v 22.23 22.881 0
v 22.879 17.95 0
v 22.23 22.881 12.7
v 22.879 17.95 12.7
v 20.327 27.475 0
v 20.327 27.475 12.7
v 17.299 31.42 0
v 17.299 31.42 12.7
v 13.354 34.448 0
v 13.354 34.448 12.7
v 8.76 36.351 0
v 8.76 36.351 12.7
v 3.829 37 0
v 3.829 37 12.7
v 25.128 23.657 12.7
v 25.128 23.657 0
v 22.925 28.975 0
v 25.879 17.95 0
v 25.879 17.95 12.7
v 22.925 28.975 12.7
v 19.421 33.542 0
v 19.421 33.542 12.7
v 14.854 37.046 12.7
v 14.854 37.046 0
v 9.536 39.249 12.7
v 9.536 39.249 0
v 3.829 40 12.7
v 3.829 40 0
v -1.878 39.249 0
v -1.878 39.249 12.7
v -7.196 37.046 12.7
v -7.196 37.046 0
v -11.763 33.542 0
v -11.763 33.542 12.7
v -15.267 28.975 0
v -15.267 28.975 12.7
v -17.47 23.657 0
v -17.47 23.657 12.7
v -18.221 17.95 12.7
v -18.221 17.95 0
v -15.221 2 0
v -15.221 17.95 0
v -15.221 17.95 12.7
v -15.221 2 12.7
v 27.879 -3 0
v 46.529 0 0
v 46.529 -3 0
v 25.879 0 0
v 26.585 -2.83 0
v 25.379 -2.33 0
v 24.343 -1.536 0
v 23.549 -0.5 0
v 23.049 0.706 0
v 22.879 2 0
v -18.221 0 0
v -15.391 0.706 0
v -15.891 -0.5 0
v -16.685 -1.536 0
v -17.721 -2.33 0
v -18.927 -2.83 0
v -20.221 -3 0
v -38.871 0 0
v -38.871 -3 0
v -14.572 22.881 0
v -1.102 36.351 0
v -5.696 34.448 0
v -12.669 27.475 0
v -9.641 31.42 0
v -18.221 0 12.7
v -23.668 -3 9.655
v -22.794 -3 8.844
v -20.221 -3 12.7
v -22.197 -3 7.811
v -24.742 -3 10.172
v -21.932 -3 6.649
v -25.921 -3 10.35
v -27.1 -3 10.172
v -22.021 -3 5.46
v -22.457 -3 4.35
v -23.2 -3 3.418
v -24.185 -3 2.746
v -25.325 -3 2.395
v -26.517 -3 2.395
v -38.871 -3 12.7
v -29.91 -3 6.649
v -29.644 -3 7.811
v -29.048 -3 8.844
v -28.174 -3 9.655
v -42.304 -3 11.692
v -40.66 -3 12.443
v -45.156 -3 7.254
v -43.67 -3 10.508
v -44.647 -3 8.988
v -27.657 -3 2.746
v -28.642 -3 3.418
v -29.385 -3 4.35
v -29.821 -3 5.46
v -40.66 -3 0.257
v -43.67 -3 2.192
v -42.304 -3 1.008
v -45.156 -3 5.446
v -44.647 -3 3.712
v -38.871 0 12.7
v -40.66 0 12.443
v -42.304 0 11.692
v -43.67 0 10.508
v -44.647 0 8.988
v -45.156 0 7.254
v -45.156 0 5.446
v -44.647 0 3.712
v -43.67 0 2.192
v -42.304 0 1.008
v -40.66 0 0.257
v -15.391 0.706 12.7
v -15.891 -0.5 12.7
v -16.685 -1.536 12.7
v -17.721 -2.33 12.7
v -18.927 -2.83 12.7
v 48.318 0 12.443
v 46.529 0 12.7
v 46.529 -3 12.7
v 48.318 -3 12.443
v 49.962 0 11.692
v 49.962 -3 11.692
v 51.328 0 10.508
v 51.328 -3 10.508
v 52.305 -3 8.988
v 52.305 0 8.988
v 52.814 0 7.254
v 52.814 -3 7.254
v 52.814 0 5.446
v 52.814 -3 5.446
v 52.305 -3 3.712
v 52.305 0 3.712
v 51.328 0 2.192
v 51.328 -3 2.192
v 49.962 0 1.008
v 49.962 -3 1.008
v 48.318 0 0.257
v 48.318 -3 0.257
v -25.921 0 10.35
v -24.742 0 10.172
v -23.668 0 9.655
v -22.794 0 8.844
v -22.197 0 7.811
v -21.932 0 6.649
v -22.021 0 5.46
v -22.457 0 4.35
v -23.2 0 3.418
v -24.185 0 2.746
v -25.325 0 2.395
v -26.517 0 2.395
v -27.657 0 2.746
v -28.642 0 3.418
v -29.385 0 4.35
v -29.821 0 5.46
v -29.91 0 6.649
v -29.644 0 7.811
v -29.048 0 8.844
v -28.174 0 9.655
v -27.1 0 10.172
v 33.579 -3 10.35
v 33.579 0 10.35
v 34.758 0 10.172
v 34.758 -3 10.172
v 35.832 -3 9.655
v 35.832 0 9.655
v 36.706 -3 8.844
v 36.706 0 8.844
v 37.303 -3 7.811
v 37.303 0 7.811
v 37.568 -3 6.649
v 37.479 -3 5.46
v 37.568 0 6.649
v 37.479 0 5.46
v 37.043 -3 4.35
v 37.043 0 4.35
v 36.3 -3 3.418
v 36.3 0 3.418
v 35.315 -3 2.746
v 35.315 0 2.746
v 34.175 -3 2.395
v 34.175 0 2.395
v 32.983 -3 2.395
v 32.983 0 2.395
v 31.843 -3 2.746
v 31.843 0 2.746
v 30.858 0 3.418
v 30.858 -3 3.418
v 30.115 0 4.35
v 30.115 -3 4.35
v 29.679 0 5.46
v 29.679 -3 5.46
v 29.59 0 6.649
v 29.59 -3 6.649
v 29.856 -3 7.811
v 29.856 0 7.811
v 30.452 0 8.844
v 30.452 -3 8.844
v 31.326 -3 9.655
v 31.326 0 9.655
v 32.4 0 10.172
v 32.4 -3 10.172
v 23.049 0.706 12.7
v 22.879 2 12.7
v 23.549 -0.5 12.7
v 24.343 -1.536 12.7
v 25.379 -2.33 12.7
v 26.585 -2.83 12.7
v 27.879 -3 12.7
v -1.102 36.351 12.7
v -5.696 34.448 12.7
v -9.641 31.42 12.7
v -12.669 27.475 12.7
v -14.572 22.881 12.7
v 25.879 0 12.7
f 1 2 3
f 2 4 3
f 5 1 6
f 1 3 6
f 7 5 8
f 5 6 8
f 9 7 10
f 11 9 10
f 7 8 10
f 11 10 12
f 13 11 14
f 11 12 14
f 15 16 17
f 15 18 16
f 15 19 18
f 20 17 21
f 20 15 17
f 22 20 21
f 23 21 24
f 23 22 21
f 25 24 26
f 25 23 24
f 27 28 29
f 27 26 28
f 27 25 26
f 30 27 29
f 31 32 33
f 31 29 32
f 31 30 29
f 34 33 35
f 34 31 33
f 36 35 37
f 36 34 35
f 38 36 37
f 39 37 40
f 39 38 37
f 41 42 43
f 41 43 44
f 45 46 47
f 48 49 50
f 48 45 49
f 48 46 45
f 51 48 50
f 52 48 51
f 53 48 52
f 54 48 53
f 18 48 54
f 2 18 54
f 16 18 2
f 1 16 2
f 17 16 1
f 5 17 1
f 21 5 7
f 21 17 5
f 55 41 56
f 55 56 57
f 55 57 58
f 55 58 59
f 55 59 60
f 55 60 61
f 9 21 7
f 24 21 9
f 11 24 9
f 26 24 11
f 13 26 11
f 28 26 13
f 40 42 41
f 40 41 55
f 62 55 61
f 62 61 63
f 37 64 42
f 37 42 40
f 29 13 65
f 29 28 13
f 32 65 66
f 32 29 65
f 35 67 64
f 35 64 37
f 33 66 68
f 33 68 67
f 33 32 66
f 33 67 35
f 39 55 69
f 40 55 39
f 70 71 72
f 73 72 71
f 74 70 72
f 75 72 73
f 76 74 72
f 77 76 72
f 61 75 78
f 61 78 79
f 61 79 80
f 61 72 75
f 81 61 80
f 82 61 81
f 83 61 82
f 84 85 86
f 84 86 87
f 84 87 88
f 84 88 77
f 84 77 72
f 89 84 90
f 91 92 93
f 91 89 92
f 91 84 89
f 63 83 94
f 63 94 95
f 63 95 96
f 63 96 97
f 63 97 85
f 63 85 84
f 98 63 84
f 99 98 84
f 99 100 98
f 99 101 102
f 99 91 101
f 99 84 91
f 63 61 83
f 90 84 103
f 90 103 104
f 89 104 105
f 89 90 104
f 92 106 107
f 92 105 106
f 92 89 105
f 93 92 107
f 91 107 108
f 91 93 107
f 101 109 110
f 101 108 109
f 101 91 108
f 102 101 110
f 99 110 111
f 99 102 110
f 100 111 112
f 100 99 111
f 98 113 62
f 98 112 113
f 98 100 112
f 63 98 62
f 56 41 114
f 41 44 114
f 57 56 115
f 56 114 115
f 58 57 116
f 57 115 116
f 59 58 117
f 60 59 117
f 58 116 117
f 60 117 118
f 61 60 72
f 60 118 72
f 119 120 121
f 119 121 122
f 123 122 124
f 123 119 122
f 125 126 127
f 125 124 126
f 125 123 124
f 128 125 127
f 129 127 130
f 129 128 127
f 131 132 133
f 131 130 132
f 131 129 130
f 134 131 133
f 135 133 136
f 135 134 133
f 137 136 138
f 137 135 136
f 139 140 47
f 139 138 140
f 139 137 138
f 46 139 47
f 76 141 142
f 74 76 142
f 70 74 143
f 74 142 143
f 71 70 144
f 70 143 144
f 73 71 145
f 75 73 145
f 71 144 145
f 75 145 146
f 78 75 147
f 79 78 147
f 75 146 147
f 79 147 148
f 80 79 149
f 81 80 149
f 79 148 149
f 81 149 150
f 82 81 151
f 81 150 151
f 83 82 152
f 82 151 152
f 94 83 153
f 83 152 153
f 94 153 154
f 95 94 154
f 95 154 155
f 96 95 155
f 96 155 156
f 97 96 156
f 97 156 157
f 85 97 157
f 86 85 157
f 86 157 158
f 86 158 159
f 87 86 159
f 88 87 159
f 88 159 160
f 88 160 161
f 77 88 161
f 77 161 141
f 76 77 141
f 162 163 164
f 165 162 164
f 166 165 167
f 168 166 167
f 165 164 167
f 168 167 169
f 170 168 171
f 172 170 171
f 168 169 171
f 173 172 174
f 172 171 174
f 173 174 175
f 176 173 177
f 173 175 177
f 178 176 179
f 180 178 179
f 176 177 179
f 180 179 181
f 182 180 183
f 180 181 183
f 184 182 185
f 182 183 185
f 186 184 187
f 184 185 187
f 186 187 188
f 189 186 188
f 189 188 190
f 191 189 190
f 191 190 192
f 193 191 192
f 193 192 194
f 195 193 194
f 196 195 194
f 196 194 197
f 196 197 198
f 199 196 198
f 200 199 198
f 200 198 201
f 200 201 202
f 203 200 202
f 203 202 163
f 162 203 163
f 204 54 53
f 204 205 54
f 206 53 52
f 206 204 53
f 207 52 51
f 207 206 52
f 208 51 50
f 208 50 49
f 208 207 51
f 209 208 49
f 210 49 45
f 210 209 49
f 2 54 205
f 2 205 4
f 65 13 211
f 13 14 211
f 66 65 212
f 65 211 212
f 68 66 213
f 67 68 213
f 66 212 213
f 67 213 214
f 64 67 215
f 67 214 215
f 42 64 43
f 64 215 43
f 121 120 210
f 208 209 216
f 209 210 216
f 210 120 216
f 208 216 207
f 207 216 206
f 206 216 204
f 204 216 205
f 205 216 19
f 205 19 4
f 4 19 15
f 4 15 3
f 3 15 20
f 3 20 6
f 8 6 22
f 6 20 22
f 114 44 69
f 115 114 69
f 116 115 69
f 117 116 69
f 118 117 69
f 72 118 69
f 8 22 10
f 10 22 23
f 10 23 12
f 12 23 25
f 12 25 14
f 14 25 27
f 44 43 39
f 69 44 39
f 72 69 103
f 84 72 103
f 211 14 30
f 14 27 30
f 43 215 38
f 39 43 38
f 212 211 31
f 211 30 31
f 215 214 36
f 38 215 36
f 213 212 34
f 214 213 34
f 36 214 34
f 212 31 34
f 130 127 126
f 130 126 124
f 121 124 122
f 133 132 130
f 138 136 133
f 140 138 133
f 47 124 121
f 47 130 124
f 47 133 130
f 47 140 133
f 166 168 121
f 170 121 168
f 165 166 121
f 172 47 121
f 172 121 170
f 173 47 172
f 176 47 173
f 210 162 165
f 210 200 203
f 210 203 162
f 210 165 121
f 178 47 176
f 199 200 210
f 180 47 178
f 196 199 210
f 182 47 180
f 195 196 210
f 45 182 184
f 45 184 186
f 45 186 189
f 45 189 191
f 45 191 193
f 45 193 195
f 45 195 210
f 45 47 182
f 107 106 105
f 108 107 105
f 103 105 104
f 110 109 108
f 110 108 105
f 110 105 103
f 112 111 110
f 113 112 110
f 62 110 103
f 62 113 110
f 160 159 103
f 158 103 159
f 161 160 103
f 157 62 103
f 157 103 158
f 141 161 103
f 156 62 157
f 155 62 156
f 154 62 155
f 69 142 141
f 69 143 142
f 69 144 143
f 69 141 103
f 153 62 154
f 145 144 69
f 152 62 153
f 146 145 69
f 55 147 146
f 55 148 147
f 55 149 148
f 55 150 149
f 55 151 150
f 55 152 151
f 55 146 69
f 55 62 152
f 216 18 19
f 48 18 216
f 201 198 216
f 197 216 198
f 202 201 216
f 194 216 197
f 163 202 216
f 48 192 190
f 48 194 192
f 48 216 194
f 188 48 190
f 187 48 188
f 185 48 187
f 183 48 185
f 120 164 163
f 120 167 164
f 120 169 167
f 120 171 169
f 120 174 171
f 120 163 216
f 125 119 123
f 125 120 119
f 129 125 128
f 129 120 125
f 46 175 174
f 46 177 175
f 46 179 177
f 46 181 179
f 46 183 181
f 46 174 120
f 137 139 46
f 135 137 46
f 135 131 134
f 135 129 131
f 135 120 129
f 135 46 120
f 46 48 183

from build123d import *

# Parameters (mm, degrees)
BOSS_EXTRUDE1_DEPTH = 12.7
FILLET1_R           = 19.05
FILLET4_RADIUS      = 22.05
FILLET4_LENGTH      = 12.7
SKETCH2_R           = 4
CUT_EXTRUDE1_DEPTH  = 68.509113983
FILLET5_RADIUS      = 6.35
FILLET5_LENGTH      = 3
FILLET6_RADIUS      = 6.35
FILLET6_LENGTH      = 3
FILLET7_R           = 5


with BuildPart() as part:
    # Sketch1 → Boss-Extrude1 (new body)
    with BuildSketch(Plane.XY):
        Polygon((-45.220982698, 0), (-18.220982698, 0), (-18.220982698, 40), (25.879017302, 40), (25.879017302, 0), (52.879017302, 0), (52.879017302, -3), (22.879017302, -3), (22.879017302, 37), (-15.220982698, 37), (-15.220982698, -3), (-45.220982698, -3), align=None)
    extrude(amount=BOSS_EXTRUDE1_DEPTH)

    # Fillet1
    fillet1_edges = [part.edges().sort_by_distance(p)[0] for p in [
        (22.879017302, 37, 6.35),
        (-15.220982698, 37, 6.35),
    ]]
    fillet(fillet1_edges, radius=FILLET1_R - 0.0001)  # a hair under: the kernel refuses the full size

    # Fillet4: full round fillet: the end face becomes a half cylinder, R = half its width
    fillet4_face = Plane((3.829017302, 40, 6.35), x_dir=(0, 0, 1), z_dir=(0, 1, 0))  # on the end face: x along it, z out of the body
    fillet4_slab = fillet4_face.offset(-FILLET4_RADIUS / 2) * Box(FILLET4_LENGTH, 2 * FILLET4_RADIUS, FILLET4_RADIUS, mode=Mode.PRIVATE)  # the body's end, R deep
    fillet4_round = Plane((3.829017302, 17.95, 6.35), x_dir=(0, 1, 0), z_dir=(0, 0, 1)) * Cylinder(FILLET4_RADIUS, FILLET4_LENGTH, mode=Mode.PRIVATE)  # its axis R under the face
    add(fillet4_slab - fillet4_round, mode=Mode.SUBTRACT)

    # Sketch2 → Cut-Extrude1 (cut, through all)
    with BuildSketch(Plane(origin=(0, 0, 0), x_dir=(1, 0, 0), z_dir=(0, 1, 0))):
        with Locations(Location((-25.920982698, -6.35, 0), (0, 0, 270))):
            Circle(SKETCH2_R)
        with Locations(Location((33.579017302, -6.35, 0), (0, 0, 270))):
            Circle(SKETCH2_R)
    extrude(amount=-CUT_EXTRUDE1_DEPTH, mode=Mode.SUBTRACT)

    # Fillet5: full round fillet: the end face becomes a half cylinder, R = half its width
    fillet5_face = Plane((-45.220982698, -1.5, 6.35), x_dir=(0, -1, 0), z_dir=(-1, 0, 0))  # on the end face: x along it, z out of the body
    fillet5_slab = fillet5_face.offset(-FILLET5_RADIUS / 2) * Box(FILLET5_LENGTH, 2 * FILLET5_RADIUS, FILLET5_RADIUS, mode=Mode.PRIVATE)  # the body's end, R deep
    fillet5_round = Plane((-38.870982698, -1.5, 6.35), x_dir=(-1, 0, 0), z_dir=(0, -1, 0)) * Cylinder(FILLET5_RADIUS, FILLET5_LENGTH, mode=Mode.PRIVATE)  # its axis R under the face
    add(fillet5_slab - fillet5_round, mode=Mode.SUBTRACT)

    # Fillet6: full round fillet: the end face becomes a half cylinder, R = half its width
    fillet6_face = Plane((52.879017302, -1.5, 6.35), x_dir=(0, 1, 0), z_dir=(1, 0, 0))  # on the end face: x along it, z out of the body
    fillet6_slab = fillet6_face.offset(-FILLET6_RADIUS / 2) * Box(FILLET6_LENGTH, 2 * FILLET6_RADIUS, FILLET6_RADIUS, mode=Mode.PRIVATE)  # the body's end, R deep
    fillet6_round = Plane((46.529017302, -1.5, 6.35), x_dir=(1, 0, 0), z_dir=(0, 1, 0)) * Cylinder(FILLET6_RADIUS, FILLET6_LENGTH, mode=Mode.PRIVATE)  # its axis R under the face
    add(fillet6_slab - fillet6_round, mode=Mode.SUBTRACT)

    # Fillet7
    fillet7_edges = [part.edges().sort_by_distance(p)[0] for p in [
        (22.879017302, -3, 6.35),
        (-15.220982698, -3, 6.35),
    ]]
    fillet(fillet7_edges, radius=FILLET7_R)


solid = part.part
